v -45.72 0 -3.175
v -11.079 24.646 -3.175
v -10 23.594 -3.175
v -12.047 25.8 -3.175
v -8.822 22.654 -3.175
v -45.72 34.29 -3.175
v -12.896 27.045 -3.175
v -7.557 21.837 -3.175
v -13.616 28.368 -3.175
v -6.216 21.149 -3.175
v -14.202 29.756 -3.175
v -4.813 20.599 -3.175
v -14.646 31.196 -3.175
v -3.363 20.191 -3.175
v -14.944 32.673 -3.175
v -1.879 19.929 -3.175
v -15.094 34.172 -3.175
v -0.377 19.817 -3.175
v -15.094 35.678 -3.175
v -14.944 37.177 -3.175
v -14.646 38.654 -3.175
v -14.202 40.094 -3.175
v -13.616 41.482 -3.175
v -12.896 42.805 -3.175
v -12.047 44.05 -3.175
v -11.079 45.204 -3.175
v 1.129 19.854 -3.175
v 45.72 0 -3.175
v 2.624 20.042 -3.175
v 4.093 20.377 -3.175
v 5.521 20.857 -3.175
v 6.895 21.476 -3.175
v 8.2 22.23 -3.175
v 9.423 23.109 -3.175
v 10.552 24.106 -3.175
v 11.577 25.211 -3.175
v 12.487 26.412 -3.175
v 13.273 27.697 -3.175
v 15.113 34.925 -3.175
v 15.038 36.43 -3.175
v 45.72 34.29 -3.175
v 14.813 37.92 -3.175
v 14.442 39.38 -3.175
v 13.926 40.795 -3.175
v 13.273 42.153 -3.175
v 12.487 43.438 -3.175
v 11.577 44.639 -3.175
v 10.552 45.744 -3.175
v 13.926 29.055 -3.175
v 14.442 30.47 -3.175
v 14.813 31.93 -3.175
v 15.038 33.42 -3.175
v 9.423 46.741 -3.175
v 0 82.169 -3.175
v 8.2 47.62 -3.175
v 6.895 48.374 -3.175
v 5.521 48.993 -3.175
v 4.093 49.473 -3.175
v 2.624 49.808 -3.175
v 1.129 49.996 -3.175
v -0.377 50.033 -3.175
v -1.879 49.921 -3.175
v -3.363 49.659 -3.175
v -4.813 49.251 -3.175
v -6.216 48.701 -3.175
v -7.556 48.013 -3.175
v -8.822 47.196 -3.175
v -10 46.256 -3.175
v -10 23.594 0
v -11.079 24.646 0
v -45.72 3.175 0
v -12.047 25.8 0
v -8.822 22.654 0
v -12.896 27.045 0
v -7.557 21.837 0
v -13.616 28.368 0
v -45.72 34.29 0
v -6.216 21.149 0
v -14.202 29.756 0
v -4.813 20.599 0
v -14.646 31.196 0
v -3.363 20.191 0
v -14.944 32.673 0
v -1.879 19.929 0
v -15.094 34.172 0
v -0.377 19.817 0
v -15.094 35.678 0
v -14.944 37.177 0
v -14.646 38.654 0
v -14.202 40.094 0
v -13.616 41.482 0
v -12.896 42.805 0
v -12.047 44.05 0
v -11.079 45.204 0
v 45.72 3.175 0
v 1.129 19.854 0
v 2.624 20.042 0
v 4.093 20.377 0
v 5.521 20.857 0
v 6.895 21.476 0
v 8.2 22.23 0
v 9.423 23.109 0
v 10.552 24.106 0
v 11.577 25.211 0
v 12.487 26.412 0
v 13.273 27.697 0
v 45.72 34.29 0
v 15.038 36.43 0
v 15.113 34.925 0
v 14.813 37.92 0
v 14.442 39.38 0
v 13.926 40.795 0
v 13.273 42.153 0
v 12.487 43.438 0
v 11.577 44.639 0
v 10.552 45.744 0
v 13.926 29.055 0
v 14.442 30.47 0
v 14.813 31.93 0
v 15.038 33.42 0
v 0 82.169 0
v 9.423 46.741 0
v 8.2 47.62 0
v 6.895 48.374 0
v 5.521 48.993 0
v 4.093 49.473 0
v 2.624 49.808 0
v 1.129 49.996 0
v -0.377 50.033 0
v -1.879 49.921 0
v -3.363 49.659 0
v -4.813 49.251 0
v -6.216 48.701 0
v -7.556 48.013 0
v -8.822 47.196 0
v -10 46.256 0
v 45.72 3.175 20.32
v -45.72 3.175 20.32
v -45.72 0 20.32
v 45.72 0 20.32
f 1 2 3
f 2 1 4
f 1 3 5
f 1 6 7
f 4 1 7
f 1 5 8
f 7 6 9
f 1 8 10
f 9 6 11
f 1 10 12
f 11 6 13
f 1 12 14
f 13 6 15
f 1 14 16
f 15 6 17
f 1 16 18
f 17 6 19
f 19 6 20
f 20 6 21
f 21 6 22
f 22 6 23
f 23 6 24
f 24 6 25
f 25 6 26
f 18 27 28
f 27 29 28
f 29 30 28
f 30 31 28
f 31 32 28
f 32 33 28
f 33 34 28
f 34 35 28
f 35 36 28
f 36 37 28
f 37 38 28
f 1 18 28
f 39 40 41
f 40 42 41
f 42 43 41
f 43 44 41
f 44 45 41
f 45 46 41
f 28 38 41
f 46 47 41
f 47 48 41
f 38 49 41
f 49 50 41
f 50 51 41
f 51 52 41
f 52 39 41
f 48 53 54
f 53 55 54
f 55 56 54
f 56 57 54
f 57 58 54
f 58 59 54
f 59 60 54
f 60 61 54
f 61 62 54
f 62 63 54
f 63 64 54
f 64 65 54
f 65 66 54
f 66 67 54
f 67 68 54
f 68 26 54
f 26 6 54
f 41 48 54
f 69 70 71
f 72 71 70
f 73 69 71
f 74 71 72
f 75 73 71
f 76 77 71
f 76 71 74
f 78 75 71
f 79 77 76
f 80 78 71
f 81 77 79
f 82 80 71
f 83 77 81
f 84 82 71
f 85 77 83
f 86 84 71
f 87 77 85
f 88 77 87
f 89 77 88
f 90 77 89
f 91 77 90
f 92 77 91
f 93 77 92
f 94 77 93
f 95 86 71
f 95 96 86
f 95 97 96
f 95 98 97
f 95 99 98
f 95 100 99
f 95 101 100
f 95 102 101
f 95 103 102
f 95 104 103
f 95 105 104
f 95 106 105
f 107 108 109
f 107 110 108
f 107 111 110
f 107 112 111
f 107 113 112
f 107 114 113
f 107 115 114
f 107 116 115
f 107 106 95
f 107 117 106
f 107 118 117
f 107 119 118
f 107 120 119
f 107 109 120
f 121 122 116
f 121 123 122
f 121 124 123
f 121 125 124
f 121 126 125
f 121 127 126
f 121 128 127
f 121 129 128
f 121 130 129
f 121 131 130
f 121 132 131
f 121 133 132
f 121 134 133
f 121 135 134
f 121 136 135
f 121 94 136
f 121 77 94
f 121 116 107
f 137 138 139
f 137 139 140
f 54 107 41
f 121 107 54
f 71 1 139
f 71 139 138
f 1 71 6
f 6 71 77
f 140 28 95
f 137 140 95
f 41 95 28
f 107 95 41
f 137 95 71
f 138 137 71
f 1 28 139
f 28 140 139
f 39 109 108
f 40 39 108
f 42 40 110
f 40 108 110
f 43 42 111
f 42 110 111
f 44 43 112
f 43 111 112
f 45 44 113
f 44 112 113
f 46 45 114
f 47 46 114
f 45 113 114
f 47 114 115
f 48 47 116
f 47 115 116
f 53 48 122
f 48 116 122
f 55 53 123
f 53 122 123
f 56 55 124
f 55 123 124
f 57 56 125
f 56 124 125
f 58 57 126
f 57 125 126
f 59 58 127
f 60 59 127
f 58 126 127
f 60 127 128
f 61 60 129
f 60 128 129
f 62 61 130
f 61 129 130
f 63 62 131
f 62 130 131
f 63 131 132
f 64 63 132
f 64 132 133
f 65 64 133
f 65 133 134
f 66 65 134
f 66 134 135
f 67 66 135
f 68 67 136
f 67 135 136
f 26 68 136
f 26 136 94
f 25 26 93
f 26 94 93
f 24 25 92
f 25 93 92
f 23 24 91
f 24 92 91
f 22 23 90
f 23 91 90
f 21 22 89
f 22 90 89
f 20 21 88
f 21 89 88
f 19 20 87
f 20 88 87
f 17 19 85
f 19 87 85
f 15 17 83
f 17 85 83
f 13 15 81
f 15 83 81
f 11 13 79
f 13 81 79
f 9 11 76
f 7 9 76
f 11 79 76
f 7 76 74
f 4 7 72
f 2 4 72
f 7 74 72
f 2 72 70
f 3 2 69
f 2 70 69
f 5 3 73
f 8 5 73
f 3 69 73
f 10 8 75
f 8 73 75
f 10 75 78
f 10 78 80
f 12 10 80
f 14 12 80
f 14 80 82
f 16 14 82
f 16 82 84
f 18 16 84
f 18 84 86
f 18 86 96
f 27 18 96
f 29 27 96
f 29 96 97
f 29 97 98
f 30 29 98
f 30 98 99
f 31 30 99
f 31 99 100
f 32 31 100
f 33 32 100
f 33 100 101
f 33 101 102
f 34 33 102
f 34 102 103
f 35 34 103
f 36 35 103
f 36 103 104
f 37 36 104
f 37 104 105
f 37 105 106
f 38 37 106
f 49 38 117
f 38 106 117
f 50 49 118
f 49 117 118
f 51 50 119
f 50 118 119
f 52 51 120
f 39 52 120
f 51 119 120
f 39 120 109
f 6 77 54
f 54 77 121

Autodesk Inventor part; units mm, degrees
ref_plane "YZ Plane" through (0, 0, 0) normal (1, 0, 0) x (0, 1, 0)
ref_plane "XZ Plane" through (0, 0, 0) normal (0, 1, 0) x (-1, 0, 0)
ref_plane "XY Plane" through (0, 0, 0) normal (0, 0, 1) x (1, 0, 0)
sketch "Sketch1" plane through (0, 0, 0) normal (0, 0, 1) x (1, 0, 0)
  line L0 (0, 0) -> (45.72, 0)
  line L1 (45.72, 0) -> (45.72, 34.29)
  line L2 (0, 0) -> (0, 82.169) construction
  line L3 (45.72, 34.29) -> (0, 82.169)
  line L4 (0, 0) -> (-45.72, 0)
  line L5 (-45.72, 0) -> (-45.72, 34.29)
  line L6 (-45.72, 34.29) -> (0, 82.169)
  dimension "d0" = 82.169
  dimension "d1" = 45.72
  dimension "d2" = 34.29
extrude "Extrusion1" add sketch "Sketch1" against normal blind 3.175
sketch "Sketch2" plane through (0, 0, 0) normal (0, 0, 1) x (1, 0, 0)
  line L0 (-45.72, 0) -> (-45.72, 34.29) projected
  line L1 (-45.72, 0) -> (45.72, 0)
  line L2 (45.72, 0) -> (45.72, 3.175)
  line L3 (45.72, 3.175) -> (-45.72, 3.175)
  line L4 (-45.72, 3.175) -> (-45.72, 0)
  point P0 (0, 0)
  dimension "d5" = 3.175
extrude "Extrusion2" add sketch "Sketch2" along normal blind 20.32
sketch "Sketch3" plane through (0, 0, 0) normal (0, 0, 1) x (1, 0, 0)
  circle A0 centre (0, 34.925) radius 15.113
  line L0 (-45.72, 0) -> (45.72, 0) projected
  point P0 (0, 0)
  dimension "d8" = 30.226
  dimension "d9" = 34.925
extrude "Extrusion3" cut sketch "Sketch3" against normal through all
properties part number "rsSnowBlowerMount"
